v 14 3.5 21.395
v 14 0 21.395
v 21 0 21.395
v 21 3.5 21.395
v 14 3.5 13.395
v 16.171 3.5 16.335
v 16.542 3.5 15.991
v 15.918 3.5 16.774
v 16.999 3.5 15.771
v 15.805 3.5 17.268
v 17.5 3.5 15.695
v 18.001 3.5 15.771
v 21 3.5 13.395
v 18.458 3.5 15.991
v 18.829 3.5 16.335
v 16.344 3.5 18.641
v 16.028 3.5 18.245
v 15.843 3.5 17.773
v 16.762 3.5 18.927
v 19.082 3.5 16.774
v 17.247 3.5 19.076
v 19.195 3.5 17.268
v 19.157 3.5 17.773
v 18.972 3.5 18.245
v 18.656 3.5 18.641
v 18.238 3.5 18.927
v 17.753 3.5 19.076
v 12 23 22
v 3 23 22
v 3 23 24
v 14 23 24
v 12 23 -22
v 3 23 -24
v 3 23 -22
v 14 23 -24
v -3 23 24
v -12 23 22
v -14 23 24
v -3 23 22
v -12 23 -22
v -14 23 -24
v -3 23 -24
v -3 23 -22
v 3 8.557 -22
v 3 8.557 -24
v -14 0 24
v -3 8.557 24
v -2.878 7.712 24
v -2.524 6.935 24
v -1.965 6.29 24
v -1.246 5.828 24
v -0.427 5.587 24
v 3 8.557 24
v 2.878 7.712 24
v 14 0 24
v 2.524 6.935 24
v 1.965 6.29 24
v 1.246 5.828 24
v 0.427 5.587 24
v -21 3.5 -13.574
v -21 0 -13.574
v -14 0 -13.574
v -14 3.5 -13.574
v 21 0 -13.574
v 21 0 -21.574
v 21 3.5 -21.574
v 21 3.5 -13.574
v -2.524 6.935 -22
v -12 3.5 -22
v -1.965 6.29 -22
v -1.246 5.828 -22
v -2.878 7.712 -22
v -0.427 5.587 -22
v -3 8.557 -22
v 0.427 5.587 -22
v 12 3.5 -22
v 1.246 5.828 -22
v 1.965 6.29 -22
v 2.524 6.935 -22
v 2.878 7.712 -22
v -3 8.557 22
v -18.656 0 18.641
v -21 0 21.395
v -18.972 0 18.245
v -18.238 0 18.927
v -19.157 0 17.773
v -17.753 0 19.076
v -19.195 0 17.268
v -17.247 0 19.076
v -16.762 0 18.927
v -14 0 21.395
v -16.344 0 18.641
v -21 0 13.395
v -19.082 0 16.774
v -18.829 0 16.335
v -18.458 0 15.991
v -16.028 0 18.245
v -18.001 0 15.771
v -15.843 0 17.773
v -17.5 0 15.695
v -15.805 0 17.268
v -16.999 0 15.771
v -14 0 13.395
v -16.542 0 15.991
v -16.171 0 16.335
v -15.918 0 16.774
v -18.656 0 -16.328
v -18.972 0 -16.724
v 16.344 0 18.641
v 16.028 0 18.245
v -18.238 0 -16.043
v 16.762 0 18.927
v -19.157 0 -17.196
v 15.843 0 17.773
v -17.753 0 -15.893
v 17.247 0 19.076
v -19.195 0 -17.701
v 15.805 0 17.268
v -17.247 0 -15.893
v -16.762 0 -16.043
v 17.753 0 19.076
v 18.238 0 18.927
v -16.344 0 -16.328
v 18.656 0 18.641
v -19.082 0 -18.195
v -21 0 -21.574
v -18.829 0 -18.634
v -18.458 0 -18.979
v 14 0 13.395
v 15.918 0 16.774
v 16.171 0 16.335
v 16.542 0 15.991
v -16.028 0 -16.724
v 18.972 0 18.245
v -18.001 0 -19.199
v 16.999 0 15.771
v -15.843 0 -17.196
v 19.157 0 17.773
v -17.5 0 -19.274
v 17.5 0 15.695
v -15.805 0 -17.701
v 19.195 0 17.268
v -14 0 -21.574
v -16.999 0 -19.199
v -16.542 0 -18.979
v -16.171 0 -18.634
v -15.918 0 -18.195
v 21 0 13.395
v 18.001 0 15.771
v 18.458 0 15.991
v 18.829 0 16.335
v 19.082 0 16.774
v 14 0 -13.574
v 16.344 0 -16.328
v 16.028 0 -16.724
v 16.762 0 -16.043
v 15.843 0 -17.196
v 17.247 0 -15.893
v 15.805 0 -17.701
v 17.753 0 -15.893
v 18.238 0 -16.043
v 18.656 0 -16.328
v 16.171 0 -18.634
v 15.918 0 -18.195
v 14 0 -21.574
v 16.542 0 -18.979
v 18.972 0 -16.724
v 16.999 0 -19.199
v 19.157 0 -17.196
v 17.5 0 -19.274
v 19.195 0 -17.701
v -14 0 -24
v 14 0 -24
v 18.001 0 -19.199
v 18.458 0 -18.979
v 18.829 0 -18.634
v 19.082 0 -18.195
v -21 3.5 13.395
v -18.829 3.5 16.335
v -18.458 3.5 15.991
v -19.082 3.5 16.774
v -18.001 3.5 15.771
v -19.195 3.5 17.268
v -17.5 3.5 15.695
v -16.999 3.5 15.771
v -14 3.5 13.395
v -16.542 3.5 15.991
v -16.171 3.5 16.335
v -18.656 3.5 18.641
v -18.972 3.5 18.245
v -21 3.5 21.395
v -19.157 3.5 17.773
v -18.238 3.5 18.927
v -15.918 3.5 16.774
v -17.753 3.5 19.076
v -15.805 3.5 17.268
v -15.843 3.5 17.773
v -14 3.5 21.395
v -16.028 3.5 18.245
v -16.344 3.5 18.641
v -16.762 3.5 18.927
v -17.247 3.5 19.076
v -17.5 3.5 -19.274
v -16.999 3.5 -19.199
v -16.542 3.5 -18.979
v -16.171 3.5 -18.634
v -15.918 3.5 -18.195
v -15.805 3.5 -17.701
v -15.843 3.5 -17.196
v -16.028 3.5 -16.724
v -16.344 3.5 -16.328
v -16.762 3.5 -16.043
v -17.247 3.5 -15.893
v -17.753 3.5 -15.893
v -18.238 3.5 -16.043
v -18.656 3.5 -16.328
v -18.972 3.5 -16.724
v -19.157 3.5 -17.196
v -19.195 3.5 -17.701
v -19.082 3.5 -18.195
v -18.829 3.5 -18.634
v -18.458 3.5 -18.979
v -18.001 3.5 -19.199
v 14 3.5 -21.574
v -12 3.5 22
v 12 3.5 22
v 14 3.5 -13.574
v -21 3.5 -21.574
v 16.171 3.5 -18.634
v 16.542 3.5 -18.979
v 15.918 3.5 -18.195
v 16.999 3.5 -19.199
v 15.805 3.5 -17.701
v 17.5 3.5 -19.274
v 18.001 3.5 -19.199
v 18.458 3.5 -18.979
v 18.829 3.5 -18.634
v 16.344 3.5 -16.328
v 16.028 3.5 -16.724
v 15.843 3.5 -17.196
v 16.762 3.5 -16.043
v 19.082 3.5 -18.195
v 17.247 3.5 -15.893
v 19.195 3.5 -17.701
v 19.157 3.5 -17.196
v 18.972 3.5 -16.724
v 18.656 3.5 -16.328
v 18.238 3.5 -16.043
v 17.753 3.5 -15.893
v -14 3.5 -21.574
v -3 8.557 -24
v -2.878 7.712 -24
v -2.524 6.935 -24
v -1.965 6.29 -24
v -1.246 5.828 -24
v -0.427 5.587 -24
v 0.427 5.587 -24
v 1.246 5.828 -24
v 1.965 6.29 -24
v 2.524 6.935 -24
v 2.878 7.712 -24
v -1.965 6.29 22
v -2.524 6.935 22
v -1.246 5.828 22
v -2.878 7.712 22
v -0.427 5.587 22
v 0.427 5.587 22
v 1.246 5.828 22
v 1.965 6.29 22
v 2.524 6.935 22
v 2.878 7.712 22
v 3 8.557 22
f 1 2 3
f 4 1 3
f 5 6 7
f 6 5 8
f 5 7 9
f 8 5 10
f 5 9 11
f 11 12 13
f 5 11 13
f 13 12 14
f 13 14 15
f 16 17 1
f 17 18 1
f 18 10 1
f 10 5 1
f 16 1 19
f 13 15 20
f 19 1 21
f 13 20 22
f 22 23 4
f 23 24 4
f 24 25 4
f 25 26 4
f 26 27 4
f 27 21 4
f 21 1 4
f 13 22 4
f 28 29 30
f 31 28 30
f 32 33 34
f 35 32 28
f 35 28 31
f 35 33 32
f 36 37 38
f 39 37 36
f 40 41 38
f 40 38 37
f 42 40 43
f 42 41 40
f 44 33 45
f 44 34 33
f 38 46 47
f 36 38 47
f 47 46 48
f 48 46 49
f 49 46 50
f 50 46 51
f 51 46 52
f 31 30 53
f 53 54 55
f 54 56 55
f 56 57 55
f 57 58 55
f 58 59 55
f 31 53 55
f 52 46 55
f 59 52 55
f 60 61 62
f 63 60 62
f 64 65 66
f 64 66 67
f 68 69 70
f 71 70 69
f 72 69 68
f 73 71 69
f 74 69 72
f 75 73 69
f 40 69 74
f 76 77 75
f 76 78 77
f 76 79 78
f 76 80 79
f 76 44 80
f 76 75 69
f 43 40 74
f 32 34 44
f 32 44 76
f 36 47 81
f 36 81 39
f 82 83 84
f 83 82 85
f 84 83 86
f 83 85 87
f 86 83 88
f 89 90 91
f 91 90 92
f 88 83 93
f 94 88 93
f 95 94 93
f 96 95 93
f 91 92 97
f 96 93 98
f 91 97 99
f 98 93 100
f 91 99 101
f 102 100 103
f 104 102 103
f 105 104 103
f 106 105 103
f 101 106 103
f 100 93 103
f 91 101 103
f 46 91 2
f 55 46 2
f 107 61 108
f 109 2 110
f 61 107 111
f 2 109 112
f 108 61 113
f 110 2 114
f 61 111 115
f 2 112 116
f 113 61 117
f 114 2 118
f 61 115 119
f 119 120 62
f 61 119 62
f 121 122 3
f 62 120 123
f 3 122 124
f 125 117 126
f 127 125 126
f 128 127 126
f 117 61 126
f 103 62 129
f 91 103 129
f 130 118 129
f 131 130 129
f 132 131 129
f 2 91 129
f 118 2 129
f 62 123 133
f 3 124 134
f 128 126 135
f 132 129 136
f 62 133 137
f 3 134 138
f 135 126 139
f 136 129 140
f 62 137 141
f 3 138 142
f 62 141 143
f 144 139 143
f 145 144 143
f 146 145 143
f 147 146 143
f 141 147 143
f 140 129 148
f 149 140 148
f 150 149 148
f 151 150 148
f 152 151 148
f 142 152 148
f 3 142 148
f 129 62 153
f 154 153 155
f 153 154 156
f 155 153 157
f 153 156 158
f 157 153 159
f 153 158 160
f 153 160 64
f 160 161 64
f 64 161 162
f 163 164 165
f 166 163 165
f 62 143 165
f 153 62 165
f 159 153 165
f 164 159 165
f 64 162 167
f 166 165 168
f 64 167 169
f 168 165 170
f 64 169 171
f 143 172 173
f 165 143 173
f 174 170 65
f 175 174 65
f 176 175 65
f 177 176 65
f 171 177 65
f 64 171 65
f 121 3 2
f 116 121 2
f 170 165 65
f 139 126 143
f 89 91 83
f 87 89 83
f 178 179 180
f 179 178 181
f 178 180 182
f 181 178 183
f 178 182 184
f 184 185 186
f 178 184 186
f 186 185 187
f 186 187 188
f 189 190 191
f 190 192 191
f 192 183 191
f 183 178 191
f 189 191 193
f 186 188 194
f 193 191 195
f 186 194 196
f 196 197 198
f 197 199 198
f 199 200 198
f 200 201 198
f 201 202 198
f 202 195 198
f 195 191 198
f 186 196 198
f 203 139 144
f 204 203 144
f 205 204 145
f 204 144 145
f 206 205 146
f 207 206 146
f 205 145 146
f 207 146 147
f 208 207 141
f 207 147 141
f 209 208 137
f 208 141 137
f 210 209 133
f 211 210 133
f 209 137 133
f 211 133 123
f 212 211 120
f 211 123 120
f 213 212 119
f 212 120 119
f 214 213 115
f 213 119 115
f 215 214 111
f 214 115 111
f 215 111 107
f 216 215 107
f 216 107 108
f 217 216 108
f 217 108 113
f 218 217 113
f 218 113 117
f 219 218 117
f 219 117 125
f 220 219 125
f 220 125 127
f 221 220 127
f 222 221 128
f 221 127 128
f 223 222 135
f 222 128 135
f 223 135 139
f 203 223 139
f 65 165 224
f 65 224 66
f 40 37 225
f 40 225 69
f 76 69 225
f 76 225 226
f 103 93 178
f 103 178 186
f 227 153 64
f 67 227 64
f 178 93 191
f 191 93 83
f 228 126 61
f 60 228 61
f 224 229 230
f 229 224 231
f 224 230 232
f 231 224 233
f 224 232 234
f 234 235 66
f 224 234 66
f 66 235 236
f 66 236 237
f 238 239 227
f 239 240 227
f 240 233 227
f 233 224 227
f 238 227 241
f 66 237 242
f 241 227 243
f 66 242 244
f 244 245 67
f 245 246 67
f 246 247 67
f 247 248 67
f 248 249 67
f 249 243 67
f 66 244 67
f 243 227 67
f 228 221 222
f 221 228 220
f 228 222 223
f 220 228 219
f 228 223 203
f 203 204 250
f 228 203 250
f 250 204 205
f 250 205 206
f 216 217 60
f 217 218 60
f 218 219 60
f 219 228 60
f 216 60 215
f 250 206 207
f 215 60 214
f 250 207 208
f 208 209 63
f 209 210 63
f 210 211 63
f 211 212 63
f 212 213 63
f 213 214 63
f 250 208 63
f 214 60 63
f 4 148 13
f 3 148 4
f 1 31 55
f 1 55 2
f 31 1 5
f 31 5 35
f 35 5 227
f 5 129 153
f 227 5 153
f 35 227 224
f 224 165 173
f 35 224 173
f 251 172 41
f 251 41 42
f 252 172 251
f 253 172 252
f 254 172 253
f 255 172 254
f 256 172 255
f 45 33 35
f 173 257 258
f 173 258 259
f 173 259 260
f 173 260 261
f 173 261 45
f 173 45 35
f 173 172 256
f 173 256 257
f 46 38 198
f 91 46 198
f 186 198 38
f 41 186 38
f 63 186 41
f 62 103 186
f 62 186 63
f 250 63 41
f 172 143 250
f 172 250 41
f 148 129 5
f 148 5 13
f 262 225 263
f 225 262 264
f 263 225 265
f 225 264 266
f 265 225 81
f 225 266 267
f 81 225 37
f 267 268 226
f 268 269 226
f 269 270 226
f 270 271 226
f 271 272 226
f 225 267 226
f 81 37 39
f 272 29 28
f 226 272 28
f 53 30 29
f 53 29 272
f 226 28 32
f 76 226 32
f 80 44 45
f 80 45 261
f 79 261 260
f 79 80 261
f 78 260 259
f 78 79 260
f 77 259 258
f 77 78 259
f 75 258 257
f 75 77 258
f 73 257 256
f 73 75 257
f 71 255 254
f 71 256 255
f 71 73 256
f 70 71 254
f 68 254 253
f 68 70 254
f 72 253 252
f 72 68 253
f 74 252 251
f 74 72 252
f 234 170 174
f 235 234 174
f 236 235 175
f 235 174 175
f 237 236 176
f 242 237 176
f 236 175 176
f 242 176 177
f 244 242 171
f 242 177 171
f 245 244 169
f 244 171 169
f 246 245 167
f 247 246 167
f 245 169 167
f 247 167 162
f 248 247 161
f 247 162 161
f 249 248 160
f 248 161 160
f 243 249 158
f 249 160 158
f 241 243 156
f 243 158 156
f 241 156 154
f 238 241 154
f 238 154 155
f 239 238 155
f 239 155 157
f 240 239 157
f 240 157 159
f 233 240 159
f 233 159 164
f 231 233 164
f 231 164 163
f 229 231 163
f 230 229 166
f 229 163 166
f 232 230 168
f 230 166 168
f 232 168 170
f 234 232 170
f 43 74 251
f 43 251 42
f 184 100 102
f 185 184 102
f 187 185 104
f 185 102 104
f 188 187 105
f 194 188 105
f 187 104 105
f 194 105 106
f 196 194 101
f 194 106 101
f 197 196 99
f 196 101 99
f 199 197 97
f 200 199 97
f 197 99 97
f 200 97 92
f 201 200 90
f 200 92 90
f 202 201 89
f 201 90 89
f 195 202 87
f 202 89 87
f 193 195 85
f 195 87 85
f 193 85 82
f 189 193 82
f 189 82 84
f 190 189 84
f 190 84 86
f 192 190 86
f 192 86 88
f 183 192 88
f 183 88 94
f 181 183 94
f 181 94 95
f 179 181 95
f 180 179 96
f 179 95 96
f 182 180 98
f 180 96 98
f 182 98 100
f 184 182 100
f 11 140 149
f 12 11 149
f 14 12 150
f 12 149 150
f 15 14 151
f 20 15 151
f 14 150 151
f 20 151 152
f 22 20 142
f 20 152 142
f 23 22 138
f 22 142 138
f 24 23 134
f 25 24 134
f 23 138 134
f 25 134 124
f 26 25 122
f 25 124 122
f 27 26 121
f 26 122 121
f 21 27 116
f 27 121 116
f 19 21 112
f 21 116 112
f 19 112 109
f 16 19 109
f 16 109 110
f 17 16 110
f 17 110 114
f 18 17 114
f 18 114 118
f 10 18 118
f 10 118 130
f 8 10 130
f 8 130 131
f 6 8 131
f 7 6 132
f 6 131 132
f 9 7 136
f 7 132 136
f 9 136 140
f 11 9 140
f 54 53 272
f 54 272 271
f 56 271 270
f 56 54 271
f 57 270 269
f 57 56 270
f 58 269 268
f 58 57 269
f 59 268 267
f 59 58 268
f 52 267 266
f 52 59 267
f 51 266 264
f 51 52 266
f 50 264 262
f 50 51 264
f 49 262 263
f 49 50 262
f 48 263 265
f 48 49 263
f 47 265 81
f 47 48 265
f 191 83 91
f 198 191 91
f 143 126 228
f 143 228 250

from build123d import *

# Parameters (mm, degrees)
SKETCH1_W           = 28
SKETCH1_H           = 48
BOSS_EXTRUDE1_DEPTH = 23
SKETCH3_W           = 24
SKETCH3_H           = 44
CUT_EXTRUDE1_DEPTH  = 19.5
SKETCH4_W           = 7
SKETCH4_H           = 8
BOSS_EXTRUDE2_DEPTH = 3.5
SKETCH5_R           = 1.7
CUT_EXTRUDE5_DEPTH  = 3.5
CUT_EXTRUDE7_DEPTH  = 50


with BuildPart() as part:
    # Sketch1 → Boss-Extrude1 (new body)
    with BuildSketch(Plane(origin=(0, 0, 0), x_dir=(1, 0, 0), z_dir=(0, 1, 0))):
        Rectangle(SKETCH1_W, SKETCH1_H)
    extrude(amount=BOSS_EXTRUDE1_DEPTH)

    # Sketch3 → Cut-Extrude1 (cut)
    with BuildSketch(Plane(origin=(0, 23, 0), x_dir=(1, 0, 0), z_dir=(0, 1, 0))):
        Rectangle(SKETCH3_W, SKETCH3_H)
    extrude(amount=-CUT_EXTRUDE1_DEPTH, mode=Mode.SUBTRACT)

    # Sketch4 → Boss-Extrude2 (add)
    with BuildSketch(Plane.XZ):
        with Locations((17.5, 17.395203427)):
            Rectangle(SKETCH4_W, SKETCH4_H)
        with Locations((17.5, -17.574178575)):
            Rectangle(SKETCH4_W, SKETCH4_H)
        with Locations((-17.5, -17.574178575)):
            Rectangle(SKETCH4_W, SKETCH4_H)
        with Locations((-17.5, 17.395203427)):
            Rectangle(SKETCH4_W, SKETCH4_H)
    extrude(amount=-BOSS_EXTRUDE2_DEPTH)

    # Sketch5 → Cut-Extrude5 (cut)
    with BuildSketch(Plane.XZ):
        with Locations(Location((-17.5, 17.395203427, 0), (0, 0, 270))):
            Circle(SKETCH5_R)
        with Locations(Location((-17.5, -17.574178575, 0), (0, 0, 270))):
            Circle(SKETCH5_R)
        with Locations(Location((17.5, -17.574178575, 0), (0, 0, 270))):
            Circle(SKETCH5_R)
        with Locations(Location((17.5, 17.395203427, 0), (0, 0, 270))):
            Circle(SKETCH5_R)
    extrude(amount=-CUT_EXTRUDE5_DEPTH, mode=Mode.SUBTRACT)

    # Sketch7 → Cut-Extrude7 (cut)
    with BuildSketch(Plane.XY.offset(24)):
        with BuildLine():
            Line((3, 25.962103345), (3, 8.556782005))
            ThreePointArc((3, 8.556782005), (0, 5.556782005), (-3, 8.556782005))
            Line((-3, 8.556782005), (-3, 25.962103345))
            ThreePointArc((-3, 25.962103345), (0, 28.962103345), (3, 25.962103345))
        make_face()
    extrude(amount=-CUT_EXTRUDE7_DEPTH, mode=Mode.SUBTRACT)


solid = part.part
